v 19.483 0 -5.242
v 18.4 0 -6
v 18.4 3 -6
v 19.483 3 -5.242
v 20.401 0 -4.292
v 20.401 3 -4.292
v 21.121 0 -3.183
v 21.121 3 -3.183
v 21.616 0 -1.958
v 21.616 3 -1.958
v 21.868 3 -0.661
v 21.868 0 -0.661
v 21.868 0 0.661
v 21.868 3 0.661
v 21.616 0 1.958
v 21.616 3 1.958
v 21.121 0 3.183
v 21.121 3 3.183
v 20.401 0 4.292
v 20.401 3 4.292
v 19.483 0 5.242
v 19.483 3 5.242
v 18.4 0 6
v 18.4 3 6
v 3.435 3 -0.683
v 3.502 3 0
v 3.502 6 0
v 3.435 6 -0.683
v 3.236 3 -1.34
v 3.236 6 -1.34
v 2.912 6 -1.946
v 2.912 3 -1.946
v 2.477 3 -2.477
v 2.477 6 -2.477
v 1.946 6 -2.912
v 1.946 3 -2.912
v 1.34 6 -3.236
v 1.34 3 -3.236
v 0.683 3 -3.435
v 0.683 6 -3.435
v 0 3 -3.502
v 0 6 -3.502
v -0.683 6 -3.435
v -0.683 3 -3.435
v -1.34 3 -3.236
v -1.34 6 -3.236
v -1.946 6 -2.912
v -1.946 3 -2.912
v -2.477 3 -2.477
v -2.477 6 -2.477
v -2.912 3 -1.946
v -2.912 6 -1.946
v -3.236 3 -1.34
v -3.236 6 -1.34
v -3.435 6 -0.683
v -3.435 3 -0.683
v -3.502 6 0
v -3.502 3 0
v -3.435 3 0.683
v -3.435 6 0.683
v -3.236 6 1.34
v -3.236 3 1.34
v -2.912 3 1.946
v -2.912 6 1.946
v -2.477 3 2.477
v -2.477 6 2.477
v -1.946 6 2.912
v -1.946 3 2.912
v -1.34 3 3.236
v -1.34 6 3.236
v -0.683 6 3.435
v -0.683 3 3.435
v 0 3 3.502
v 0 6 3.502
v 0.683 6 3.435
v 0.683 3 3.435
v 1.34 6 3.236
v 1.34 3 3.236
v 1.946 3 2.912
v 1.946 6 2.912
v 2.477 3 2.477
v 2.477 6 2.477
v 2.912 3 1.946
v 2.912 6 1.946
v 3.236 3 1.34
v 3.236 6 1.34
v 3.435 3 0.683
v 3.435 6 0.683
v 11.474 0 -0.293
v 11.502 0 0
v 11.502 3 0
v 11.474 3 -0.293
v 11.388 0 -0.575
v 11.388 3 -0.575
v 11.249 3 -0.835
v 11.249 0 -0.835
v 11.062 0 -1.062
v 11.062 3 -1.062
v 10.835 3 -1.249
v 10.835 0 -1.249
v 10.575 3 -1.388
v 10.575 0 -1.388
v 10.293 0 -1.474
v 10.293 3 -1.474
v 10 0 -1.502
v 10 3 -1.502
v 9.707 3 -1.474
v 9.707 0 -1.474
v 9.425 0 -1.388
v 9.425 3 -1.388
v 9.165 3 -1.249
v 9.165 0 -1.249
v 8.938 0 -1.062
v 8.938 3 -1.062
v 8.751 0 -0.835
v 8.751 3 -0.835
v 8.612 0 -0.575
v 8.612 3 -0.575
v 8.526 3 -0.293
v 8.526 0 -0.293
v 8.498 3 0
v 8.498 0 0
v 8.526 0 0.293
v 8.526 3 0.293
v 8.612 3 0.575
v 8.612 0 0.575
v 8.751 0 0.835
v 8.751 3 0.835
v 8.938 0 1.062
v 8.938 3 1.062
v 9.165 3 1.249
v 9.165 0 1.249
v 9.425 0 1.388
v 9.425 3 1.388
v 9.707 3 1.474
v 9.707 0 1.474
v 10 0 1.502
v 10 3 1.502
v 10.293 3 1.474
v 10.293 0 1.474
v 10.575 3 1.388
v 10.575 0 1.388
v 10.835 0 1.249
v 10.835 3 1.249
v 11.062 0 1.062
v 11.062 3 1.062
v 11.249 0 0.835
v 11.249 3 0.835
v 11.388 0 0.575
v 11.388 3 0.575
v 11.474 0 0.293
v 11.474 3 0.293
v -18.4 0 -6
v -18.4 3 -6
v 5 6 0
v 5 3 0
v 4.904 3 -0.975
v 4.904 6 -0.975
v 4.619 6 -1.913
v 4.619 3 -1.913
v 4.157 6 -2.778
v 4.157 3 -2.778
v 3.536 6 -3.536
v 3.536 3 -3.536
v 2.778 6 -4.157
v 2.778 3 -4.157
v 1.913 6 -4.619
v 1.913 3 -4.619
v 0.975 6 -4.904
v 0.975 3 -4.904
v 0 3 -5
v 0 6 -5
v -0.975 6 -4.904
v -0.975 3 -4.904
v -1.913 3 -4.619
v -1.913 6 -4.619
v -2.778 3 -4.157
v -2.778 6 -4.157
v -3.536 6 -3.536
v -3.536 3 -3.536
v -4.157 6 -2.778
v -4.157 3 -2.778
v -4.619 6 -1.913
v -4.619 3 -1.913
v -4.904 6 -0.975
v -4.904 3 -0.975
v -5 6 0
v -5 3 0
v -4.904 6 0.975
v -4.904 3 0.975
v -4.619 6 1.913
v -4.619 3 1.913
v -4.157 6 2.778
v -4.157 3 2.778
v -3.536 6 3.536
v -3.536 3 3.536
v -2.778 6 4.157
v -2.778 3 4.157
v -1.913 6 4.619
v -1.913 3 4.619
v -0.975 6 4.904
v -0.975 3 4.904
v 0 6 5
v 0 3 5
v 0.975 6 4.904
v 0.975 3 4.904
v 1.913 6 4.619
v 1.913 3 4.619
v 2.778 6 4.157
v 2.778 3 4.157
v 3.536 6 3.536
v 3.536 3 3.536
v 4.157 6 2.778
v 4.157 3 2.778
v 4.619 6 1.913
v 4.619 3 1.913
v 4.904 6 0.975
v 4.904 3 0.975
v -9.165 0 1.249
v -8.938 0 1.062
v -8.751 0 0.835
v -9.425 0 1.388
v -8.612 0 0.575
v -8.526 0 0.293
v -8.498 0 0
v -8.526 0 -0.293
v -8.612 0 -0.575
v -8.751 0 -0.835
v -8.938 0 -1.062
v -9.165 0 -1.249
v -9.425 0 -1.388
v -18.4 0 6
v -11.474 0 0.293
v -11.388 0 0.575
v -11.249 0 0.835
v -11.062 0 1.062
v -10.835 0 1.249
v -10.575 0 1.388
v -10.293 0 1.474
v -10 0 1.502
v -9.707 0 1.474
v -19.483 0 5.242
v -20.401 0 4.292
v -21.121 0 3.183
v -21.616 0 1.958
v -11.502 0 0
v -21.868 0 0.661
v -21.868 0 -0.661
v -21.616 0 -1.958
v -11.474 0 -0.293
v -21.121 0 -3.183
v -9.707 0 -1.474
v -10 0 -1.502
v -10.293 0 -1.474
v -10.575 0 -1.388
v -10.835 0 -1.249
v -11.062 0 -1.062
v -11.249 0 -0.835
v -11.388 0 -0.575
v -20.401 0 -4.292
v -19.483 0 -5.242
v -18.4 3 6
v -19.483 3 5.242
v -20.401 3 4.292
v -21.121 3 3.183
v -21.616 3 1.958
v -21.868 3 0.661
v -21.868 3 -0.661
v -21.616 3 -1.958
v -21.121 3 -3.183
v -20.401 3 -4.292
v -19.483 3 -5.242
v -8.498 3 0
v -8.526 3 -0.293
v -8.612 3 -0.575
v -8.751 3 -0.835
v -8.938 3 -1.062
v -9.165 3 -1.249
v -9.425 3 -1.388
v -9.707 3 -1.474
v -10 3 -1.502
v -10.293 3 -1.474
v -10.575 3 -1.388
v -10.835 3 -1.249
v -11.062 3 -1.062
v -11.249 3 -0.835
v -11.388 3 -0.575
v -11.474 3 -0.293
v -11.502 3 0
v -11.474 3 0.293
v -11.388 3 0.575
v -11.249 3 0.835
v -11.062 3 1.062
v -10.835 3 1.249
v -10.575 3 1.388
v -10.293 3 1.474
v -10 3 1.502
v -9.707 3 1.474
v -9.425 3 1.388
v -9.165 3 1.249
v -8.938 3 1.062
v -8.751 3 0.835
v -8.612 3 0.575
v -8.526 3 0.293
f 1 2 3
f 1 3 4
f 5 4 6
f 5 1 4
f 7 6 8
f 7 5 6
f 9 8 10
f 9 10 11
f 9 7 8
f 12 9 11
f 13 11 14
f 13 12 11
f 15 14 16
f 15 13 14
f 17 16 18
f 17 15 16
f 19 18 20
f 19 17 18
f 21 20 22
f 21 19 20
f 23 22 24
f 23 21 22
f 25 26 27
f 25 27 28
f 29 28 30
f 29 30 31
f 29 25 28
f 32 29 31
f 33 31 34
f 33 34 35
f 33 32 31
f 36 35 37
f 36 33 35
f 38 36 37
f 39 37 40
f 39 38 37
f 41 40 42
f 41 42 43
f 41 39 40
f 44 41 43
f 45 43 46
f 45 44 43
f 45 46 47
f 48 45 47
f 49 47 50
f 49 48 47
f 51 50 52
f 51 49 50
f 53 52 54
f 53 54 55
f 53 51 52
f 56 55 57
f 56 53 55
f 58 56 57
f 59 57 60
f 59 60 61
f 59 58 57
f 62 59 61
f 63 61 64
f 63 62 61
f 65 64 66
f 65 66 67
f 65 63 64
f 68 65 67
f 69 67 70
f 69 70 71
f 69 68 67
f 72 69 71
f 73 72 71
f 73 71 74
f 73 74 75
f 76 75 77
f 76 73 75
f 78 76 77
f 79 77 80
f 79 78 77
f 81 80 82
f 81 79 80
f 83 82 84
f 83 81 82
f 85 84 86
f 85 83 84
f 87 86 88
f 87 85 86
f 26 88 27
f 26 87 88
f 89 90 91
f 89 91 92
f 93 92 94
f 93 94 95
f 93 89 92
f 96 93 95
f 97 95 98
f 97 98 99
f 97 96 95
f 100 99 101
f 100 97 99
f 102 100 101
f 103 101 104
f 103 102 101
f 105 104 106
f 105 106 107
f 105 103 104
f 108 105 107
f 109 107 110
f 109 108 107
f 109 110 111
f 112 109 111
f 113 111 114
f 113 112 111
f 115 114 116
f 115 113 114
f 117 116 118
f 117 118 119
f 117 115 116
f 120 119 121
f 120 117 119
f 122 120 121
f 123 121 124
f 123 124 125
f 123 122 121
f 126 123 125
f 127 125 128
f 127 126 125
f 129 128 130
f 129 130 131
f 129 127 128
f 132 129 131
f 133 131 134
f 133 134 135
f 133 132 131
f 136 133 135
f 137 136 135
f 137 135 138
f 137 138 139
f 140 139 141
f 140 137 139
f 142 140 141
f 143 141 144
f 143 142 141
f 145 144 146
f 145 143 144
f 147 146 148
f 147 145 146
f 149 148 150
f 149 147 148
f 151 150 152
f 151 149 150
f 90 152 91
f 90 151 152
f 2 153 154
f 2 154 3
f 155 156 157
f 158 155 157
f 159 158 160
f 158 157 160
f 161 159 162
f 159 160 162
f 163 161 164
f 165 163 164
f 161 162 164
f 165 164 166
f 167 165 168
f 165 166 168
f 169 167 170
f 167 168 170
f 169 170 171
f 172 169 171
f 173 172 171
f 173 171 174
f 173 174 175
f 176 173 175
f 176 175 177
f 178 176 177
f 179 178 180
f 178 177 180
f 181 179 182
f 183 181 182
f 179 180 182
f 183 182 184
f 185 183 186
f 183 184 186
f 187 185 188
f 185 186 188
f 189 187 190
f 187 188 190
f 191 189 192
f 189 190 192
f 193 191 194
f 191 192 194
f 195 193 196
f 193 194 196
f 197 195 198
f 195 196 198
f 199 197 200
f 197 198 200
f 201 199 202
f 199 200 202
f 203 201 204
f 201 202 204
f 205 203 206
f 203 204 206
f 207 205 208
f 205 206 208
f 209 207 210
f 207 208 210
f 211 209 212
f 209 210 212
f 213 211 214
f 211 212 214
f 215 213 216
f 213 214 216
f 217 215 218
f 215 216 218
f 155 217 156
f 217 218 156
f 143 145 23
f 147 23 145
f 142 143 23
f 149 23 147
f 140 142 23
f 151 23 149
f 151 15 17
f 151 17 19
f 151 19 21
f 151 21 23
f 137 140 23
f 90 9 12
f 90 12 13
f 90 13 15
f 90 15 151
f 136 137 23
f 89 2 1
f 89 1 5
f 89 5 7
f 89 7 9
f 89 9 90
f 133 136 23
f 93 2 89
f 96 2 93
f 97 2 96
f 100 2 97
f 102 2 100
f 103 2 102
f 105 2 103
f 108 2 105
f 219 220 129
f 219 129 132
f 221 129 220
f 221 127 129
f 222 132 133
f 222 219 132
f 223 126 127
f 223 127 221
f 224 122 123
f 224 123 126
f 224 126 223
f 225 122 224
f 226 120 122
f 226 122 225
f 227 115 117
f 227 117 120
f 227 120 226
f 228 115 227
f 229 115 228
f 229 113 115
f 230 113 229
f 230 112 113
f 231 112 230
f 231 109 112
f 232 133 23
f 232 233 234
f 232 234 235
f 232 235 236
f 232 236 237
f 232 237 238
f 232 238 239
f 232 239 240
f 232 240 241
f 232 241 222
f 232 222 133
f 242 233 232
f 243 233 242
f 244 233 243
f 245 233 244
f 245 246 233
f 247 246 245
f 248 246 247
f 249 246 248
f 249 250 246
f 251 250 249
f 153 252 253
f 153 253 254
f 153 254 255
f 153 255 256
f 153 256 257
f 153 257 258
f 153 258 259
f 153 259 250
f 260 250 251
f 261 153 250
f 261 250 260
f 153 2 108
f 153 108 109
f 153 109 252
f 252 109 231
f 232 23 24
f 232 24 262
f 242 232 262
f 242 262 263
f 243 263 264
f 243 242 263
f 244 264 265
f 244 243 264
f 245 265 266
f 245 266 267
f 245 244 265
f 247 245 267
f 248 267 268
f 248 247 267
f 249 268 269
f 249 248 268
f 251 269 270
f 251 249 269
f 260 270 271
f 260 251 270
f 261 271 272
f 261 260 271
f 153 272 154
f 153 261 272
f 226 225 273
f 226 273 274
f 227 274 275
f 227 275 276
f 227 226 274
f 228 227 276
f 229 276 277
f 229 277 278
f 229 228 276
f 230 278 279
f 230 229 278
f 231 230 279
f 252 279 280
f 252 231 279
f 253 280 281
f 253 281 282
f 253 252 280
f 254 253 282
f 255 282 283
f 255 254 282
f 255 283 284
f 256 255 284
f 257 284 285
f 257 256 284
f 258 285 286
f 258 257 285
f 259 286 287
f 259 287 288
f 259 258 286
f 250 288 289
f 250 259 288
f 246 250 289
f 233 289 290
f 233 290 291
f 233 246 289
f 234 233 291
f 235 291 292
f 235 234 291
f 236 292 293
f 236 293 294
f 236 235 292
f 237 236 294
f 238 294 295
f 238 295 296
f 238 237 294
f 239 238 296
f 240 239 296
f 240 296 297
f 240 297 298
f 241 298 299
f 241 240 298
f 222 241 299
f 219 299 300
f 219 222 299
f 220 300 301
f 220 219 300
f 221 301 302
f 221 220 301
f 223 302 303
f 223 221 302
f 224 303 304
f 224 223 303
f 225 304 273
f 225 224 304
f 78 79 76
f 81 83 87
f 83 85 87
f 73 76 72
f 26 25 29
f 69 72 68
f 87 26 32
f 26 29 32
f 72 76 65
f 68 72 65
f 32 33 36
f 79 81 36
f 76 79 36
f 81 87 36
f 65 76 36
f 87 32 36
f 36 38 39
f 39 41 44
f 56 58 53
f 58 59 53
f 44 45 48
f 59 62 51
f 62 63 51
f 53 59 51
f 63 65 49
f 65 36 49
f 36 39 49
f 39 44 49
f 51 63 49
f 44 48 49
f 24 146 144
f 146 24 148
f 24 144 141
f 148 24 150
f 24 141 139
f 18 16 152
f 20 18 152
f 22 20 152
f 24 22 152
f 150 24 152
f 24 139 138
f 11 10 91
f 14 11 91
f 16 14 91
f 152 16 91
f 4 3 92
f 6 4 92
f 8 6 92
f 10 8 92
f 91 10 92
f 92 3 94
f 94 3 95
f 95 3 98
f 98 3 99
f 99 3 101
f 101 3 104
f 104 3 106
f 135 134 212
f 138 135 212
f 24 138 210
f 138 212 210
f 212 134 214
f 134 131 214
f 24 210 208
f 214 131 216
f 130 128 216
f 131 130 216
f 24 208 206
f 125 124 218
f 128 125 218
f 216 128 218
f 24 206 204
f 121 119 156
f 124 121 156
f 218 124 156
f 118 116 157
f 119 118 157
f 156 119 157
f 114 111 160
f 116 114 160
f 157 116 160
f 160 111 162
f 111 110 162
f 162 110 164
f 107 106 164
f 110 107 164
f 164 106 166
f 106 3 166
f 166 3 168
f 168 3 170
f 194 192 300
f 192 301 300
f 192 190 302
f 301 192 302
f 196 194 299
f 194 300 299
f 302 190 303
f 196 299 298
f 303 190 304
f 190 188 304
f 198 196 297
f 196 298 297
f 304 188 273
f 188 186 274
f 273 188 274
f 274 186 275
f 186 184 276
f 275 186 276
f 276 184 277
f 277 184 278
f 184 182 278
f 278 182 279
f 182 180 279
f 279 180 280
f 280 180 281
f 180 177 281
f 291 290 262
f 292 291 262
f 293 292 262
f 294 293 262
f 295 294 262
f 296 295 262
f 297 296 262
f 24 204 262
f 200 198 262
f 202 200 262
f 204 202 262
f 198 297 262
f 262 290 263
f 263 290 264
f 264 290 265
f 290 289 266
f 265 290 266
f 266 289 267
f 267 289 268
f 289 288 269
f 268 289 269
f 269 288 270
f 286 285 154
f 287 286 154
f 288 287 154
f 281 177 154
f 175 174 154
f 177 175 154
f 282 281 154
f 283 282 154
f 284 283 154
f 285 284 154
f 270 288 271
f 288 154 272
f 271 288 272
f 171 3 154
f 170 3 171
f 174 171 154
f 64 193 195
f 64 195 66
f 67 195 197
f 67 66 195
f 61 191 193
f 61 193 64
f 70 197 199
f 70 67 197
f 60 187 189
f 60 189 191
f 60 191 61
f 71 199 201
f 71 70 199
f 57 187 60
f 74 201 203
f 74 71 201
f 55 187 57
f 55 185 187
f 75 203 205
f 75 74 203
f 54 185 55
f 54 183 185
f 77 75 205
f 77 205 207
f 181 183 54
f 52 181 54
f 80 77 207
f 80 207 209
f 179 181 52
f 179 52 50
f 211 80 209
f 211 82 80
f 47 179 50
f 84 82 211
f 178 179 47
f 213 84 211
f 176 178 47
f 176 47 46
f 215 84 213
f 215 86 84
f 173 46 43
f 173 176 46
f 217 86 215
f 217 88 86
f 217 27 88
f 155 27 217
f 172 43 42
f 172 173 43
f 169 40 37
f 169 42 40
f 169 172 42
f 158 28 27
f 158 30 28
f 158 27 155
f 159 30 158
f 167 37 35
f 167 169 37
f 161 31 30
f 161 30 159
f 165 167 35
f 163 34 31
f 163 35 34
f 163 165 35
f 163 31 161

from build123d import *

# Parameters (mm, degrees)
SKETCH1_R           = 1.5025
BOSS_EXTRUDE1_DEPTH = 3
SKETCH2_R           = 5
SKETCH2_R_2         = 3.5025
BOSS_EXTRUDE2_DEPTH = 3


with BuildPart() as part:
    # Sketch1 → Boss-Extrude1 (new body)
    with BuildSketch(Plane(origin=(0, 0, 0), x_dir=(1, 0, 0), z_dir=(0, 1, 0))):
        with BuildLine():
            Line((-18.4, 6), (18.4, 6))
            ThreePointArc((18.4, 6), (21.9, 0), (18.4, -6))
            Line((18.4, -6), (-18.4, -6))
            ThreePointArc((-18.4, -6), (-21.9, 0), (-18.4, 6))
        make_face()
        with Locations((10, 0)):
            Circle(SKETCH1_R, mode=Mode.SUBTRACT)
        with Locations((-10, 0)):
            Circle(SKETCH1_R, mode=Mode.SUBTRACT)
    extrude(amount=BOSS_EXTRUDE1_DEPTH)

    # Sketch2 → Boss-Extrude2 (add)
    with BuildSketch(Plane(origin=(0, 3, 0), x_dir=(1, 0, 0), z_dir=(0, 1, 0))):
        Circle(SKETCH2_R)
        Circle(SKETCH2_R_2, mode=Mode.SUBTRACT)
    extrude(amount=BOSS_EXTRUDE2_DEPTH)


solid = part.part
